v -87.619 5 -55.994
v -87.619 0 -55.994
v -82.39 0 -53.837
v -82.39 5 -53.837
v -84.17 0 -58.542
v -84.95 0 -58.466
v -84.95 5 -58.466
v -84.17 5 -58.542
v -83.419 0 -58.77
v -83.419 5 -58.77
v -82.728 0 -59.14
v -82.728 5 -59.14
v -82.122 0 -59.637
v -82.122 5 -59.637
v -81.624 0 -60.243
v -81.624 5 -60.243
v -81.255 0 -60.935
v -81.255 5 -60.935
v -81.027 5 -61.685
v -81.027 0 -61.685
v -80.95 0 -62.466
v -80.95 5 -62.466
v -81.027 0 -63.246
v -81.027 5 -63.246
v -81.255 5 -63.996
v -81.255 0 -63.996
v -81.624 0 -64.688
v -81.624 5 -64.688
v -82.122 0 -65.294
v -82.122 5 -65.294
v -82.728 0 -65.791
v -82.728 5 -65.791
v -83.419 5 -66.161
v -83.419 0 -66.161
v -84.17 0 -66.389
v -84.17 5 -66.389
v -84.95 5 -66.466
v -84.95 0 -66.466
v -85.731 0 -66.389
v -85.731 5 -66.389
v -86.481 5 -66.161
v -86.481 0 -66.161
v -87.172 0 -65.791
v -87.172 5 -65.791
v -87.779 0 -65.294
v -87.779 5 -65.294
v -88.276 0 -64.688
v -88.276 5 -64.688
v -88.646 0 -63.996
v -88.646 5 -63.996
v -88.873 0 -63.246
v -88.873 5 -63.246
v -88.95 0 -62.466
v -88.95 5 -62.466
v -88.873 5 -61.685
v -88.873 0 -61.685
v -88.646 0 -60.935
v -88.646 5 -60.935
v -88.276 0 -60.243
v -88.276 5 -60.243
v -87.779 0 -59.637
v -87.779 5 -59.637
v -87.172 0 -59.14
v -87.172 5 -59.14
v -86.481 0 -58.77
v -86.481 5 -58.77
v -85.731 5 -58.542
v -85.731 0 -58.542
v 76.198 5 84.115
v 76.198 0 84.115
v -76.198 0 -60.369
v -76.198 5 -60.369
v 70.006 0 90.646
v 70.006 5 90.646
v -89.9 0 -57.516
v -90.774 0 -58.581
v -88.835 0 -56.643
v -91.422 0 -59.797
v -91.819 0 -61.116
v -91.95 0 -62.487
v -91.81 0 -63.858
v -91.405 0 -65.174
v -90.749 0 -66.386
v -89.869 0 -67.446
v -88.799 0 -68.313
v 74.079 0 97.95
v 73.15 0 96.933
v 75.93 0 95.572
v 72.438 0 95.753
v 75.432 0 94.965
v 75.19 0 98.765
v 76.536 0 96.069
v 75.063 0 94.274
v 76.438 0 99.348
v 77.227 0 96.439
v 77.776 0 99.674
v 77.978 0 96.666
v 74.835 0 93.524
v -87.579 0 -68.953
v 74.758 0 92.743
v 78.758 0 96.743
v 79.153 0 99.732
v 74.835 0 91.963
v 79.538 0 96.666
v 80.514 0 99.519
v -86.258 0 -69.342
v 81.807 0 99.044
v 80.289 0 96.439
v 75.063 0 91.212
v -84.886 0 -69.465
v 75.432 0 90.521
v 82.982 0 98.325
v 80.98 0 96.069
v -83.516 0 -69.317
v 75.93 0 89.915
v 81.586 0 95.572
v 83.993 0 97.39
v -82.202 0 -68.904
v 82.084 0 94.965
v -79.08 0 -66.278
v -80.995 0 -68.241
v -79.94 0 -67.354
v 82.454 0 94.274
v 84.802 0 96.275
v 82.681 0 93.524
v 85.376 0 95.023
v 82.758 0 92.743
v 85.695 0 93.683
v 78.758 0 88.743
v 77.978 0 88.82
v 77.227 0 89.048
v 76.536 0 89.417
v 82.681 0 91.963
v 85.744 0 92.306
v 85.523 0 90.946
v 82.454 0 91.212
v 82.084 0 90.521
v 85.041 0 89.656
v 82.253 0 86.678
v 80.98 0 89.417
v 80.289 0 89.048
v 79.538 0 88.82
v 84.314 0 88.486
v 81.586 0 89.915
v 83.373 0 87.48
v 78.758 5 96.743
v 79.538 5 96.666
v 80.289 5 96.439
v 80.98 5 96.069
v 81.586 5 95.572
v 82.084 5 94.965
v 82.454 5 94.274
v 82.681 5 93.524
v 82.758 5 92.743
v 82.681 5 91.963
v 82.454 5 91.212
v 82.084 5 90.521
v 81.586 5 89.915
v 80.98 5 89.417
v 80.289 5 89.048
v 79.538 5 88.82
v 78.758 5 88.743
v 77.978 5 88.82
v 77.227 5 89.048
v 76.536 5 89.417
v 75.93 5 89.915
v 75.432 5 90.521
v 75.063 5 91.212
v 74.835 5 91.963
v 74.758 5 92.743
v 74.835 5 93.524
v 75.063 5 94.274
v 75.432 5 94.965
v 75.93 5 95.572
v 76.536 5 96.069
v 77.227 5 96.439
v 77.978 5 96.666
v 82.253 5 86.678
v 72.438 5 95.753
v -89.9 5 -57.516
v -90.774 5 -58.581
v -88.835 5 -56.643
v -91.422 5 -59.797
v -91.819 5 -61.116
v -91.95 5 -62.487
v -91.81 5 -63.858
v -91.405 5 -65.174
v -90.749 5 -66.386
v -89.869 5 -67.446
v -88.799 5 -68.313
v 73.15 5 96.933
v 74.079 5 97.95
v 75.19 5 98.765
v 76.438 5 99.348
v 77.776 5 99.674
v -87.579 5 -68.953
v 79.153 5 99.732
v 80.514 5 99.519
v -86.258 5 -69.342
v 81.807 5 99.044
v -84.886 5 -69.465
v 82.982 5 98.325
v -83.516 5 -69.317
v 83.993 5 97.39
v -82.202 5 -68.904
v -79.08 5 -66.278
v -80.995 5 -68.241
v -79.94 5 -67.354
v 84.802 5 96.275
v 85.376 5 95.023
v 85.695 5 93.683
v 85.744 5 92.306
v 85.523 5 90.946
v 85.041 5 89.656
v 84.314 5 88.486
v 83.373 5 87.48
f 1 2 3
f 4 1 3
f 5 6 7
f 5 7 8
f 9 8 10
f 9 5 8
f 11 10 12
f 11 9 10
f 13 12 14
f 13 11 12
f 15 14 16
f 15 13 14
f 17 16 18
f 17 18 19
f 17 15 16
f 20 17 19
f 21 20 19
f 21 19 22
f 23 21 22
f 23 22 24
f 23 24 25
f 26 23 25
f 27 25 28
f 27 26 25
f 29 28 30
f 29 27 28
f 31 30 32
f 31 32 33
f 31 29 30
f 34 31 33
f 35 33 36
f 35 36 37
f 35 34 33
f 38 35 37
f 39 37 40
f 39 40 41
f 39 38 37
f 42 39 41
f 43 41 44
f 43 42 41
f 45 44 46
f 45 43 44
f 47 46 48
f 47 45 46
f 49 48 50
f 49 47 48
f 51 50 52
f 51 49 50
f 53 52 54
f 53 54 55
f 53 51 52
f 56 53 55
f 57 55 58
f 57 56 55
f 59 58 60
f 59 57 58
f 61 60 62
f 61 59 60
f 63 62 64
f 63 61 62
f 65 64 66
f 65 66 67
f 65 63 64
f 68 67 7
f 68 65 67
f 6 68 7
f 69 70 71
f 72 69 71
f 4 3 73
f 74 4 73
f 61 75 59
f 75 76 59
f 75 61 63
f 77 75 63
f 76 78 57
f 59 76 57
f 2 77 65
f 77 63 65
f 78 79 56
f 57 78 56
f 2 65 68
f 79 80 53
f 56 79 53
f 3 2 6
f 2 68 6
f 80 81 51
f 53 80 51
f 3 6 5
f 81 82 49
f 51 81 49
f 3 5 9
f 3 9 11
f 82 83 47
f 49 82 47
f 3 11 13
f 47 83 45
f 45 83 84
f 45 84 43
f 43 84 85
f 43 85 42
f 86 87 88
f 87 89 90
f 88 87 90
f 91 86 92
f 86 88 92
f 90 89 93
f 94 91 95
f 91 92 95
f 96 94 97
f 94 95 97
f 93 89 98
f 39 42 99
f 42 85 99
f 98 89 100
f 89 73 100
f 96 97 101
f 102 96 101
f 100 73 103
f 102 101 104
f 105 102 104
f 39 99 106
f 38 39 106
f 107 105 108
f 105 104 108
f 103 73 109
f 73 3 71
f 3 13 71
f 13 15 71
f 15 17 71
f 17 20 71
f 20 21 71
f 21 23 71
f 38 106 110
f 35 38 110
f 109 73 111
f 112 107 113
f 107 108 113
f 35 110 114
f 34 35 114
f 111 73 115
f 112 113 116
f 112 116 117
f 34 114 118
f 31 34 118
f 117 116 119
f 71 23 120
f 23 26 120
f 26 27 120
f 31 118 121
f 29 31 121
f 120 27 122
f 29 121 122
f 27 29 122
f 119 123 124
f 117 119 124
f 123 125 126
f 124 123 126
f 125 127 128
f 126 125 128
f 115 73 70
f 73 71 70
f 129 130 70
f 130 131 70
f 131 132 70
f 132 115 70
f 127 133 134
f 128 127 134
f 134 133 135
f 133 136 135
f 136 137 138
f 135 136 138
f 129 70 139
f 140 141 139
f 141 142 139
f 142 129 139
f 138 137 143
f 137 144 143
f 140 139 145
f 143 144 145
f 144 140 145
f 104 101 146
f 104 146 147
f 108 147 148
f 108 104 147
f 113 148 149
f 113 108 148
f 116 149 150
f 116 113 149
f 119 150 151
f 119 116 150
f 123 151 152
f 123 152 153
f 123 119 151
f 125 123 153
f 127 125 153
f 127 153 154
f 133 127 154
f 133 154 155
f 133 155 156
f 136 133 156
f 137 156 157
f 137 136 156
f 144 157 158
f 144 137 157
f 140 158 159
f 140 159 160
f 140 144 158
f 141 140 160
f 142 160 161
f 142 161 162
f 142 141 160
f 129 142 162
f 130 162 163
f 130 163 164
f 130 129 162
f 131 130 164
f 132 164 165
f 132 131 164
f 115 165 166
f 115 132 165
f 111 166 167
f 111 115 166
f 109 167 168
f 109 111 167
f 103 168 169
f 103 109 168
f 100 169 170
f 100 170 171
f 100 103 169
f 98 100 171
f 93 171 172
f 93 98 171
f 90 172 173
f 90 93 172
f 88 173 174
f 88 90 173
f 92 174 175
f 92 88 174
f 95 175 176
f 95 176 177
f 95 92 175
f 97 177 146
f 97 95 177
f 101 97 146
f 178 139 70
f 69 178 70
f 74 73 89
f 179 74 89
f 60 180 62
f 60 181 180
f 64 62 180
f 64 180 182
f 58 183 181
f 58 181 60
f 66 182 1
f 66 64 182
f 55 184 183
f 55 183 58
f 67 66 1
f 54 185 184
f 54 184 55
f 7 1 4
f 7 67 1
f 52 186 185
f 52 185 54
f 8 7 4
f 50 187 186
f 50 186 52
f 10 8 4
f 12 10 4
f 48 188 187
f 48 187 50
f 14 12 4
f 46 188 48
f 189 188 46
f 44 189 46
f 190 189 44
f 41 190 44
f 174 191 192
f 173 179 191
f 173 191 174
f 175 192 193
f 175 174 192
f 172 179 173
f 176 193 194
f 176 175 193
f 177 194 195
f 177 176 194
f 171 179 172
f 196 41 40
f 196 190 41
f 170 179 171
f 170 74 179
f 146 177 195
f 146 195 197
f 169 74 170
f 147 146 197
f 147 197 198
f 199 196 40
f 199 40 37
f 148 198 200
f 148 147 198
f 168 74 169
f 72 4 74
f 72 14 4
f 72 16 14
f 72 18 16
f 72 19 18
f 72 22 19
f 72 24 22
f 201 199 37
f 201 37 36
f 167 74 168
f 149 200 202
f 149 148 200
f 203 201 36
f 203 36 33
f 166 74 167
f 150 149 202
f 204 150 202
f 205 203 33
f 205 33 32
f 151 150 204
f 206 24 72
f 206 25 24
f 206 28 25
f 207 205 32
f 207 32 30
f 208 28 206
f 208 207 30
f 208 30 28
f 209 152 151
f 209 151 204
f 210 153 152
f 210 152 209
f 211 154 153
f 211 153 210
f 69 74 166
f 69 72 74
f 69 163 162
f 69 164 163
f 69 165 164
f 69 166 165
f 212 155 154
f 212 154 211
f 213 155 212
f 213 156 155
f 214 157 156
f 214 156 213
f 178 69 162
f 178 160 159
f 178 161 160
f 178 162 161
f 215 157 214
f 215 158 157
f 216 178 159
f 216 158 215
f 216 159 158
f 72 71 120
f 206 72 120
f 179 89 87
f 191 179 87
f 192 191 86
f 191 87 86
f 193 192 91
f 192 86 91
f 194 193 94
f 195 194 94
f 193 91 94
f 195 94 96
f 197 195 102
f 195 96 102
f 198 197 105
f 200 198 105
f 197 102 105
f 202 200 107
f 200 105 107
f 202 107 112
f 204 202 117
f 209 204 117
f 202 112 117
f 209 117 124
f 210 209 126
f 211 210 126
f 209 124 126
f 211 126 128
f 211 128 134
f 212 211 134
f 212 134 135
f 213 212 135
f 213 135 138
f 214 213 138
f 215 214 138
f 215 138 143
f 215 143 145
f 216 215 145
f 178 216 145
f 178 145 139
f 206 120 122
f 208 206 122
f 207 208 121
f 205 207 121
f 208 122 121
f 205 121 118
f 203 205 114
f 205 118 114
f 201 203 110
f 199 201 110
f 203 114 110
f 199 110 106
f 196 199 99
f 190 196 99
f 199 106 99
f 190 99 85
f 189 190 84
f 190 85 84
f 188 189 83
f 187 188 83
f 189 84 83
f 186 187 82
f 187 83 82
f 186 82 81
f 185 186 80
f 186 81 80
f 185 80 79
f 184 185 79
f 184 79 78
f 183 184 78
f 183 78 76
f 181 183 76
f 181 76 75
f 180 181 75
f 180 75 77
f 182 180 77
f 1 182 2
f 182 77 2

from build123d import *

# Parameters (mm, degrees)
SKETCH_1_R      = 4
EXTRUDE_1_DEPTH = 5


with BuildPart() as part:
    # 草图1 → 凸台-拉伸1 (new body)
    with BuildSketch(Plane(origin=(0, 0, 0), x_dir=(1, 0, 0), z_dir=(0, 1, 0))):
        with BuildLine():
            Line((-76.197907508, 60.368596958), (-79.079757453, 66.278376643))
            ThreePointArc((-79.079757453, 66.278376643), (-90.335533029, 66.937484633), (-87.619490015, 55.994449518))
            Line((-87.619490015, 55.994449518), (-82.39006252, 53.837347743))
            Line((-82.39006252, 53.837347743), (70.005752496, -90.646269203))
            Line((70.005752496, -90.646269203), (72.438335487, -95.753376015))
            ThreePointArc((72.438335487, -95.753376015), (83.510505182, -97.882687035), (82.252798454, -86.677996903))
            Line((82.252798454, -86.677996903), (76.197907508, -84.115019988))
            Line((76.197907508, -84.115019988), (-76.197907508, 60.368596958))
        make_face()
        with Locations(Location((-84.950212753, 62.465535895, 0), (0, 0, 270))):
            Circle(SKETCH_1_R, mode=Mode.SUBTRACT)
        with Locations(Location((78.758057741, -92.74320814, 0), (0, 0, 270))):
            Circle(SKETCH_1_R, mode=Mode.SUBTRACT)
    extrude(amount=EXTRUDE_1_DEPTH)


solid = part.part
